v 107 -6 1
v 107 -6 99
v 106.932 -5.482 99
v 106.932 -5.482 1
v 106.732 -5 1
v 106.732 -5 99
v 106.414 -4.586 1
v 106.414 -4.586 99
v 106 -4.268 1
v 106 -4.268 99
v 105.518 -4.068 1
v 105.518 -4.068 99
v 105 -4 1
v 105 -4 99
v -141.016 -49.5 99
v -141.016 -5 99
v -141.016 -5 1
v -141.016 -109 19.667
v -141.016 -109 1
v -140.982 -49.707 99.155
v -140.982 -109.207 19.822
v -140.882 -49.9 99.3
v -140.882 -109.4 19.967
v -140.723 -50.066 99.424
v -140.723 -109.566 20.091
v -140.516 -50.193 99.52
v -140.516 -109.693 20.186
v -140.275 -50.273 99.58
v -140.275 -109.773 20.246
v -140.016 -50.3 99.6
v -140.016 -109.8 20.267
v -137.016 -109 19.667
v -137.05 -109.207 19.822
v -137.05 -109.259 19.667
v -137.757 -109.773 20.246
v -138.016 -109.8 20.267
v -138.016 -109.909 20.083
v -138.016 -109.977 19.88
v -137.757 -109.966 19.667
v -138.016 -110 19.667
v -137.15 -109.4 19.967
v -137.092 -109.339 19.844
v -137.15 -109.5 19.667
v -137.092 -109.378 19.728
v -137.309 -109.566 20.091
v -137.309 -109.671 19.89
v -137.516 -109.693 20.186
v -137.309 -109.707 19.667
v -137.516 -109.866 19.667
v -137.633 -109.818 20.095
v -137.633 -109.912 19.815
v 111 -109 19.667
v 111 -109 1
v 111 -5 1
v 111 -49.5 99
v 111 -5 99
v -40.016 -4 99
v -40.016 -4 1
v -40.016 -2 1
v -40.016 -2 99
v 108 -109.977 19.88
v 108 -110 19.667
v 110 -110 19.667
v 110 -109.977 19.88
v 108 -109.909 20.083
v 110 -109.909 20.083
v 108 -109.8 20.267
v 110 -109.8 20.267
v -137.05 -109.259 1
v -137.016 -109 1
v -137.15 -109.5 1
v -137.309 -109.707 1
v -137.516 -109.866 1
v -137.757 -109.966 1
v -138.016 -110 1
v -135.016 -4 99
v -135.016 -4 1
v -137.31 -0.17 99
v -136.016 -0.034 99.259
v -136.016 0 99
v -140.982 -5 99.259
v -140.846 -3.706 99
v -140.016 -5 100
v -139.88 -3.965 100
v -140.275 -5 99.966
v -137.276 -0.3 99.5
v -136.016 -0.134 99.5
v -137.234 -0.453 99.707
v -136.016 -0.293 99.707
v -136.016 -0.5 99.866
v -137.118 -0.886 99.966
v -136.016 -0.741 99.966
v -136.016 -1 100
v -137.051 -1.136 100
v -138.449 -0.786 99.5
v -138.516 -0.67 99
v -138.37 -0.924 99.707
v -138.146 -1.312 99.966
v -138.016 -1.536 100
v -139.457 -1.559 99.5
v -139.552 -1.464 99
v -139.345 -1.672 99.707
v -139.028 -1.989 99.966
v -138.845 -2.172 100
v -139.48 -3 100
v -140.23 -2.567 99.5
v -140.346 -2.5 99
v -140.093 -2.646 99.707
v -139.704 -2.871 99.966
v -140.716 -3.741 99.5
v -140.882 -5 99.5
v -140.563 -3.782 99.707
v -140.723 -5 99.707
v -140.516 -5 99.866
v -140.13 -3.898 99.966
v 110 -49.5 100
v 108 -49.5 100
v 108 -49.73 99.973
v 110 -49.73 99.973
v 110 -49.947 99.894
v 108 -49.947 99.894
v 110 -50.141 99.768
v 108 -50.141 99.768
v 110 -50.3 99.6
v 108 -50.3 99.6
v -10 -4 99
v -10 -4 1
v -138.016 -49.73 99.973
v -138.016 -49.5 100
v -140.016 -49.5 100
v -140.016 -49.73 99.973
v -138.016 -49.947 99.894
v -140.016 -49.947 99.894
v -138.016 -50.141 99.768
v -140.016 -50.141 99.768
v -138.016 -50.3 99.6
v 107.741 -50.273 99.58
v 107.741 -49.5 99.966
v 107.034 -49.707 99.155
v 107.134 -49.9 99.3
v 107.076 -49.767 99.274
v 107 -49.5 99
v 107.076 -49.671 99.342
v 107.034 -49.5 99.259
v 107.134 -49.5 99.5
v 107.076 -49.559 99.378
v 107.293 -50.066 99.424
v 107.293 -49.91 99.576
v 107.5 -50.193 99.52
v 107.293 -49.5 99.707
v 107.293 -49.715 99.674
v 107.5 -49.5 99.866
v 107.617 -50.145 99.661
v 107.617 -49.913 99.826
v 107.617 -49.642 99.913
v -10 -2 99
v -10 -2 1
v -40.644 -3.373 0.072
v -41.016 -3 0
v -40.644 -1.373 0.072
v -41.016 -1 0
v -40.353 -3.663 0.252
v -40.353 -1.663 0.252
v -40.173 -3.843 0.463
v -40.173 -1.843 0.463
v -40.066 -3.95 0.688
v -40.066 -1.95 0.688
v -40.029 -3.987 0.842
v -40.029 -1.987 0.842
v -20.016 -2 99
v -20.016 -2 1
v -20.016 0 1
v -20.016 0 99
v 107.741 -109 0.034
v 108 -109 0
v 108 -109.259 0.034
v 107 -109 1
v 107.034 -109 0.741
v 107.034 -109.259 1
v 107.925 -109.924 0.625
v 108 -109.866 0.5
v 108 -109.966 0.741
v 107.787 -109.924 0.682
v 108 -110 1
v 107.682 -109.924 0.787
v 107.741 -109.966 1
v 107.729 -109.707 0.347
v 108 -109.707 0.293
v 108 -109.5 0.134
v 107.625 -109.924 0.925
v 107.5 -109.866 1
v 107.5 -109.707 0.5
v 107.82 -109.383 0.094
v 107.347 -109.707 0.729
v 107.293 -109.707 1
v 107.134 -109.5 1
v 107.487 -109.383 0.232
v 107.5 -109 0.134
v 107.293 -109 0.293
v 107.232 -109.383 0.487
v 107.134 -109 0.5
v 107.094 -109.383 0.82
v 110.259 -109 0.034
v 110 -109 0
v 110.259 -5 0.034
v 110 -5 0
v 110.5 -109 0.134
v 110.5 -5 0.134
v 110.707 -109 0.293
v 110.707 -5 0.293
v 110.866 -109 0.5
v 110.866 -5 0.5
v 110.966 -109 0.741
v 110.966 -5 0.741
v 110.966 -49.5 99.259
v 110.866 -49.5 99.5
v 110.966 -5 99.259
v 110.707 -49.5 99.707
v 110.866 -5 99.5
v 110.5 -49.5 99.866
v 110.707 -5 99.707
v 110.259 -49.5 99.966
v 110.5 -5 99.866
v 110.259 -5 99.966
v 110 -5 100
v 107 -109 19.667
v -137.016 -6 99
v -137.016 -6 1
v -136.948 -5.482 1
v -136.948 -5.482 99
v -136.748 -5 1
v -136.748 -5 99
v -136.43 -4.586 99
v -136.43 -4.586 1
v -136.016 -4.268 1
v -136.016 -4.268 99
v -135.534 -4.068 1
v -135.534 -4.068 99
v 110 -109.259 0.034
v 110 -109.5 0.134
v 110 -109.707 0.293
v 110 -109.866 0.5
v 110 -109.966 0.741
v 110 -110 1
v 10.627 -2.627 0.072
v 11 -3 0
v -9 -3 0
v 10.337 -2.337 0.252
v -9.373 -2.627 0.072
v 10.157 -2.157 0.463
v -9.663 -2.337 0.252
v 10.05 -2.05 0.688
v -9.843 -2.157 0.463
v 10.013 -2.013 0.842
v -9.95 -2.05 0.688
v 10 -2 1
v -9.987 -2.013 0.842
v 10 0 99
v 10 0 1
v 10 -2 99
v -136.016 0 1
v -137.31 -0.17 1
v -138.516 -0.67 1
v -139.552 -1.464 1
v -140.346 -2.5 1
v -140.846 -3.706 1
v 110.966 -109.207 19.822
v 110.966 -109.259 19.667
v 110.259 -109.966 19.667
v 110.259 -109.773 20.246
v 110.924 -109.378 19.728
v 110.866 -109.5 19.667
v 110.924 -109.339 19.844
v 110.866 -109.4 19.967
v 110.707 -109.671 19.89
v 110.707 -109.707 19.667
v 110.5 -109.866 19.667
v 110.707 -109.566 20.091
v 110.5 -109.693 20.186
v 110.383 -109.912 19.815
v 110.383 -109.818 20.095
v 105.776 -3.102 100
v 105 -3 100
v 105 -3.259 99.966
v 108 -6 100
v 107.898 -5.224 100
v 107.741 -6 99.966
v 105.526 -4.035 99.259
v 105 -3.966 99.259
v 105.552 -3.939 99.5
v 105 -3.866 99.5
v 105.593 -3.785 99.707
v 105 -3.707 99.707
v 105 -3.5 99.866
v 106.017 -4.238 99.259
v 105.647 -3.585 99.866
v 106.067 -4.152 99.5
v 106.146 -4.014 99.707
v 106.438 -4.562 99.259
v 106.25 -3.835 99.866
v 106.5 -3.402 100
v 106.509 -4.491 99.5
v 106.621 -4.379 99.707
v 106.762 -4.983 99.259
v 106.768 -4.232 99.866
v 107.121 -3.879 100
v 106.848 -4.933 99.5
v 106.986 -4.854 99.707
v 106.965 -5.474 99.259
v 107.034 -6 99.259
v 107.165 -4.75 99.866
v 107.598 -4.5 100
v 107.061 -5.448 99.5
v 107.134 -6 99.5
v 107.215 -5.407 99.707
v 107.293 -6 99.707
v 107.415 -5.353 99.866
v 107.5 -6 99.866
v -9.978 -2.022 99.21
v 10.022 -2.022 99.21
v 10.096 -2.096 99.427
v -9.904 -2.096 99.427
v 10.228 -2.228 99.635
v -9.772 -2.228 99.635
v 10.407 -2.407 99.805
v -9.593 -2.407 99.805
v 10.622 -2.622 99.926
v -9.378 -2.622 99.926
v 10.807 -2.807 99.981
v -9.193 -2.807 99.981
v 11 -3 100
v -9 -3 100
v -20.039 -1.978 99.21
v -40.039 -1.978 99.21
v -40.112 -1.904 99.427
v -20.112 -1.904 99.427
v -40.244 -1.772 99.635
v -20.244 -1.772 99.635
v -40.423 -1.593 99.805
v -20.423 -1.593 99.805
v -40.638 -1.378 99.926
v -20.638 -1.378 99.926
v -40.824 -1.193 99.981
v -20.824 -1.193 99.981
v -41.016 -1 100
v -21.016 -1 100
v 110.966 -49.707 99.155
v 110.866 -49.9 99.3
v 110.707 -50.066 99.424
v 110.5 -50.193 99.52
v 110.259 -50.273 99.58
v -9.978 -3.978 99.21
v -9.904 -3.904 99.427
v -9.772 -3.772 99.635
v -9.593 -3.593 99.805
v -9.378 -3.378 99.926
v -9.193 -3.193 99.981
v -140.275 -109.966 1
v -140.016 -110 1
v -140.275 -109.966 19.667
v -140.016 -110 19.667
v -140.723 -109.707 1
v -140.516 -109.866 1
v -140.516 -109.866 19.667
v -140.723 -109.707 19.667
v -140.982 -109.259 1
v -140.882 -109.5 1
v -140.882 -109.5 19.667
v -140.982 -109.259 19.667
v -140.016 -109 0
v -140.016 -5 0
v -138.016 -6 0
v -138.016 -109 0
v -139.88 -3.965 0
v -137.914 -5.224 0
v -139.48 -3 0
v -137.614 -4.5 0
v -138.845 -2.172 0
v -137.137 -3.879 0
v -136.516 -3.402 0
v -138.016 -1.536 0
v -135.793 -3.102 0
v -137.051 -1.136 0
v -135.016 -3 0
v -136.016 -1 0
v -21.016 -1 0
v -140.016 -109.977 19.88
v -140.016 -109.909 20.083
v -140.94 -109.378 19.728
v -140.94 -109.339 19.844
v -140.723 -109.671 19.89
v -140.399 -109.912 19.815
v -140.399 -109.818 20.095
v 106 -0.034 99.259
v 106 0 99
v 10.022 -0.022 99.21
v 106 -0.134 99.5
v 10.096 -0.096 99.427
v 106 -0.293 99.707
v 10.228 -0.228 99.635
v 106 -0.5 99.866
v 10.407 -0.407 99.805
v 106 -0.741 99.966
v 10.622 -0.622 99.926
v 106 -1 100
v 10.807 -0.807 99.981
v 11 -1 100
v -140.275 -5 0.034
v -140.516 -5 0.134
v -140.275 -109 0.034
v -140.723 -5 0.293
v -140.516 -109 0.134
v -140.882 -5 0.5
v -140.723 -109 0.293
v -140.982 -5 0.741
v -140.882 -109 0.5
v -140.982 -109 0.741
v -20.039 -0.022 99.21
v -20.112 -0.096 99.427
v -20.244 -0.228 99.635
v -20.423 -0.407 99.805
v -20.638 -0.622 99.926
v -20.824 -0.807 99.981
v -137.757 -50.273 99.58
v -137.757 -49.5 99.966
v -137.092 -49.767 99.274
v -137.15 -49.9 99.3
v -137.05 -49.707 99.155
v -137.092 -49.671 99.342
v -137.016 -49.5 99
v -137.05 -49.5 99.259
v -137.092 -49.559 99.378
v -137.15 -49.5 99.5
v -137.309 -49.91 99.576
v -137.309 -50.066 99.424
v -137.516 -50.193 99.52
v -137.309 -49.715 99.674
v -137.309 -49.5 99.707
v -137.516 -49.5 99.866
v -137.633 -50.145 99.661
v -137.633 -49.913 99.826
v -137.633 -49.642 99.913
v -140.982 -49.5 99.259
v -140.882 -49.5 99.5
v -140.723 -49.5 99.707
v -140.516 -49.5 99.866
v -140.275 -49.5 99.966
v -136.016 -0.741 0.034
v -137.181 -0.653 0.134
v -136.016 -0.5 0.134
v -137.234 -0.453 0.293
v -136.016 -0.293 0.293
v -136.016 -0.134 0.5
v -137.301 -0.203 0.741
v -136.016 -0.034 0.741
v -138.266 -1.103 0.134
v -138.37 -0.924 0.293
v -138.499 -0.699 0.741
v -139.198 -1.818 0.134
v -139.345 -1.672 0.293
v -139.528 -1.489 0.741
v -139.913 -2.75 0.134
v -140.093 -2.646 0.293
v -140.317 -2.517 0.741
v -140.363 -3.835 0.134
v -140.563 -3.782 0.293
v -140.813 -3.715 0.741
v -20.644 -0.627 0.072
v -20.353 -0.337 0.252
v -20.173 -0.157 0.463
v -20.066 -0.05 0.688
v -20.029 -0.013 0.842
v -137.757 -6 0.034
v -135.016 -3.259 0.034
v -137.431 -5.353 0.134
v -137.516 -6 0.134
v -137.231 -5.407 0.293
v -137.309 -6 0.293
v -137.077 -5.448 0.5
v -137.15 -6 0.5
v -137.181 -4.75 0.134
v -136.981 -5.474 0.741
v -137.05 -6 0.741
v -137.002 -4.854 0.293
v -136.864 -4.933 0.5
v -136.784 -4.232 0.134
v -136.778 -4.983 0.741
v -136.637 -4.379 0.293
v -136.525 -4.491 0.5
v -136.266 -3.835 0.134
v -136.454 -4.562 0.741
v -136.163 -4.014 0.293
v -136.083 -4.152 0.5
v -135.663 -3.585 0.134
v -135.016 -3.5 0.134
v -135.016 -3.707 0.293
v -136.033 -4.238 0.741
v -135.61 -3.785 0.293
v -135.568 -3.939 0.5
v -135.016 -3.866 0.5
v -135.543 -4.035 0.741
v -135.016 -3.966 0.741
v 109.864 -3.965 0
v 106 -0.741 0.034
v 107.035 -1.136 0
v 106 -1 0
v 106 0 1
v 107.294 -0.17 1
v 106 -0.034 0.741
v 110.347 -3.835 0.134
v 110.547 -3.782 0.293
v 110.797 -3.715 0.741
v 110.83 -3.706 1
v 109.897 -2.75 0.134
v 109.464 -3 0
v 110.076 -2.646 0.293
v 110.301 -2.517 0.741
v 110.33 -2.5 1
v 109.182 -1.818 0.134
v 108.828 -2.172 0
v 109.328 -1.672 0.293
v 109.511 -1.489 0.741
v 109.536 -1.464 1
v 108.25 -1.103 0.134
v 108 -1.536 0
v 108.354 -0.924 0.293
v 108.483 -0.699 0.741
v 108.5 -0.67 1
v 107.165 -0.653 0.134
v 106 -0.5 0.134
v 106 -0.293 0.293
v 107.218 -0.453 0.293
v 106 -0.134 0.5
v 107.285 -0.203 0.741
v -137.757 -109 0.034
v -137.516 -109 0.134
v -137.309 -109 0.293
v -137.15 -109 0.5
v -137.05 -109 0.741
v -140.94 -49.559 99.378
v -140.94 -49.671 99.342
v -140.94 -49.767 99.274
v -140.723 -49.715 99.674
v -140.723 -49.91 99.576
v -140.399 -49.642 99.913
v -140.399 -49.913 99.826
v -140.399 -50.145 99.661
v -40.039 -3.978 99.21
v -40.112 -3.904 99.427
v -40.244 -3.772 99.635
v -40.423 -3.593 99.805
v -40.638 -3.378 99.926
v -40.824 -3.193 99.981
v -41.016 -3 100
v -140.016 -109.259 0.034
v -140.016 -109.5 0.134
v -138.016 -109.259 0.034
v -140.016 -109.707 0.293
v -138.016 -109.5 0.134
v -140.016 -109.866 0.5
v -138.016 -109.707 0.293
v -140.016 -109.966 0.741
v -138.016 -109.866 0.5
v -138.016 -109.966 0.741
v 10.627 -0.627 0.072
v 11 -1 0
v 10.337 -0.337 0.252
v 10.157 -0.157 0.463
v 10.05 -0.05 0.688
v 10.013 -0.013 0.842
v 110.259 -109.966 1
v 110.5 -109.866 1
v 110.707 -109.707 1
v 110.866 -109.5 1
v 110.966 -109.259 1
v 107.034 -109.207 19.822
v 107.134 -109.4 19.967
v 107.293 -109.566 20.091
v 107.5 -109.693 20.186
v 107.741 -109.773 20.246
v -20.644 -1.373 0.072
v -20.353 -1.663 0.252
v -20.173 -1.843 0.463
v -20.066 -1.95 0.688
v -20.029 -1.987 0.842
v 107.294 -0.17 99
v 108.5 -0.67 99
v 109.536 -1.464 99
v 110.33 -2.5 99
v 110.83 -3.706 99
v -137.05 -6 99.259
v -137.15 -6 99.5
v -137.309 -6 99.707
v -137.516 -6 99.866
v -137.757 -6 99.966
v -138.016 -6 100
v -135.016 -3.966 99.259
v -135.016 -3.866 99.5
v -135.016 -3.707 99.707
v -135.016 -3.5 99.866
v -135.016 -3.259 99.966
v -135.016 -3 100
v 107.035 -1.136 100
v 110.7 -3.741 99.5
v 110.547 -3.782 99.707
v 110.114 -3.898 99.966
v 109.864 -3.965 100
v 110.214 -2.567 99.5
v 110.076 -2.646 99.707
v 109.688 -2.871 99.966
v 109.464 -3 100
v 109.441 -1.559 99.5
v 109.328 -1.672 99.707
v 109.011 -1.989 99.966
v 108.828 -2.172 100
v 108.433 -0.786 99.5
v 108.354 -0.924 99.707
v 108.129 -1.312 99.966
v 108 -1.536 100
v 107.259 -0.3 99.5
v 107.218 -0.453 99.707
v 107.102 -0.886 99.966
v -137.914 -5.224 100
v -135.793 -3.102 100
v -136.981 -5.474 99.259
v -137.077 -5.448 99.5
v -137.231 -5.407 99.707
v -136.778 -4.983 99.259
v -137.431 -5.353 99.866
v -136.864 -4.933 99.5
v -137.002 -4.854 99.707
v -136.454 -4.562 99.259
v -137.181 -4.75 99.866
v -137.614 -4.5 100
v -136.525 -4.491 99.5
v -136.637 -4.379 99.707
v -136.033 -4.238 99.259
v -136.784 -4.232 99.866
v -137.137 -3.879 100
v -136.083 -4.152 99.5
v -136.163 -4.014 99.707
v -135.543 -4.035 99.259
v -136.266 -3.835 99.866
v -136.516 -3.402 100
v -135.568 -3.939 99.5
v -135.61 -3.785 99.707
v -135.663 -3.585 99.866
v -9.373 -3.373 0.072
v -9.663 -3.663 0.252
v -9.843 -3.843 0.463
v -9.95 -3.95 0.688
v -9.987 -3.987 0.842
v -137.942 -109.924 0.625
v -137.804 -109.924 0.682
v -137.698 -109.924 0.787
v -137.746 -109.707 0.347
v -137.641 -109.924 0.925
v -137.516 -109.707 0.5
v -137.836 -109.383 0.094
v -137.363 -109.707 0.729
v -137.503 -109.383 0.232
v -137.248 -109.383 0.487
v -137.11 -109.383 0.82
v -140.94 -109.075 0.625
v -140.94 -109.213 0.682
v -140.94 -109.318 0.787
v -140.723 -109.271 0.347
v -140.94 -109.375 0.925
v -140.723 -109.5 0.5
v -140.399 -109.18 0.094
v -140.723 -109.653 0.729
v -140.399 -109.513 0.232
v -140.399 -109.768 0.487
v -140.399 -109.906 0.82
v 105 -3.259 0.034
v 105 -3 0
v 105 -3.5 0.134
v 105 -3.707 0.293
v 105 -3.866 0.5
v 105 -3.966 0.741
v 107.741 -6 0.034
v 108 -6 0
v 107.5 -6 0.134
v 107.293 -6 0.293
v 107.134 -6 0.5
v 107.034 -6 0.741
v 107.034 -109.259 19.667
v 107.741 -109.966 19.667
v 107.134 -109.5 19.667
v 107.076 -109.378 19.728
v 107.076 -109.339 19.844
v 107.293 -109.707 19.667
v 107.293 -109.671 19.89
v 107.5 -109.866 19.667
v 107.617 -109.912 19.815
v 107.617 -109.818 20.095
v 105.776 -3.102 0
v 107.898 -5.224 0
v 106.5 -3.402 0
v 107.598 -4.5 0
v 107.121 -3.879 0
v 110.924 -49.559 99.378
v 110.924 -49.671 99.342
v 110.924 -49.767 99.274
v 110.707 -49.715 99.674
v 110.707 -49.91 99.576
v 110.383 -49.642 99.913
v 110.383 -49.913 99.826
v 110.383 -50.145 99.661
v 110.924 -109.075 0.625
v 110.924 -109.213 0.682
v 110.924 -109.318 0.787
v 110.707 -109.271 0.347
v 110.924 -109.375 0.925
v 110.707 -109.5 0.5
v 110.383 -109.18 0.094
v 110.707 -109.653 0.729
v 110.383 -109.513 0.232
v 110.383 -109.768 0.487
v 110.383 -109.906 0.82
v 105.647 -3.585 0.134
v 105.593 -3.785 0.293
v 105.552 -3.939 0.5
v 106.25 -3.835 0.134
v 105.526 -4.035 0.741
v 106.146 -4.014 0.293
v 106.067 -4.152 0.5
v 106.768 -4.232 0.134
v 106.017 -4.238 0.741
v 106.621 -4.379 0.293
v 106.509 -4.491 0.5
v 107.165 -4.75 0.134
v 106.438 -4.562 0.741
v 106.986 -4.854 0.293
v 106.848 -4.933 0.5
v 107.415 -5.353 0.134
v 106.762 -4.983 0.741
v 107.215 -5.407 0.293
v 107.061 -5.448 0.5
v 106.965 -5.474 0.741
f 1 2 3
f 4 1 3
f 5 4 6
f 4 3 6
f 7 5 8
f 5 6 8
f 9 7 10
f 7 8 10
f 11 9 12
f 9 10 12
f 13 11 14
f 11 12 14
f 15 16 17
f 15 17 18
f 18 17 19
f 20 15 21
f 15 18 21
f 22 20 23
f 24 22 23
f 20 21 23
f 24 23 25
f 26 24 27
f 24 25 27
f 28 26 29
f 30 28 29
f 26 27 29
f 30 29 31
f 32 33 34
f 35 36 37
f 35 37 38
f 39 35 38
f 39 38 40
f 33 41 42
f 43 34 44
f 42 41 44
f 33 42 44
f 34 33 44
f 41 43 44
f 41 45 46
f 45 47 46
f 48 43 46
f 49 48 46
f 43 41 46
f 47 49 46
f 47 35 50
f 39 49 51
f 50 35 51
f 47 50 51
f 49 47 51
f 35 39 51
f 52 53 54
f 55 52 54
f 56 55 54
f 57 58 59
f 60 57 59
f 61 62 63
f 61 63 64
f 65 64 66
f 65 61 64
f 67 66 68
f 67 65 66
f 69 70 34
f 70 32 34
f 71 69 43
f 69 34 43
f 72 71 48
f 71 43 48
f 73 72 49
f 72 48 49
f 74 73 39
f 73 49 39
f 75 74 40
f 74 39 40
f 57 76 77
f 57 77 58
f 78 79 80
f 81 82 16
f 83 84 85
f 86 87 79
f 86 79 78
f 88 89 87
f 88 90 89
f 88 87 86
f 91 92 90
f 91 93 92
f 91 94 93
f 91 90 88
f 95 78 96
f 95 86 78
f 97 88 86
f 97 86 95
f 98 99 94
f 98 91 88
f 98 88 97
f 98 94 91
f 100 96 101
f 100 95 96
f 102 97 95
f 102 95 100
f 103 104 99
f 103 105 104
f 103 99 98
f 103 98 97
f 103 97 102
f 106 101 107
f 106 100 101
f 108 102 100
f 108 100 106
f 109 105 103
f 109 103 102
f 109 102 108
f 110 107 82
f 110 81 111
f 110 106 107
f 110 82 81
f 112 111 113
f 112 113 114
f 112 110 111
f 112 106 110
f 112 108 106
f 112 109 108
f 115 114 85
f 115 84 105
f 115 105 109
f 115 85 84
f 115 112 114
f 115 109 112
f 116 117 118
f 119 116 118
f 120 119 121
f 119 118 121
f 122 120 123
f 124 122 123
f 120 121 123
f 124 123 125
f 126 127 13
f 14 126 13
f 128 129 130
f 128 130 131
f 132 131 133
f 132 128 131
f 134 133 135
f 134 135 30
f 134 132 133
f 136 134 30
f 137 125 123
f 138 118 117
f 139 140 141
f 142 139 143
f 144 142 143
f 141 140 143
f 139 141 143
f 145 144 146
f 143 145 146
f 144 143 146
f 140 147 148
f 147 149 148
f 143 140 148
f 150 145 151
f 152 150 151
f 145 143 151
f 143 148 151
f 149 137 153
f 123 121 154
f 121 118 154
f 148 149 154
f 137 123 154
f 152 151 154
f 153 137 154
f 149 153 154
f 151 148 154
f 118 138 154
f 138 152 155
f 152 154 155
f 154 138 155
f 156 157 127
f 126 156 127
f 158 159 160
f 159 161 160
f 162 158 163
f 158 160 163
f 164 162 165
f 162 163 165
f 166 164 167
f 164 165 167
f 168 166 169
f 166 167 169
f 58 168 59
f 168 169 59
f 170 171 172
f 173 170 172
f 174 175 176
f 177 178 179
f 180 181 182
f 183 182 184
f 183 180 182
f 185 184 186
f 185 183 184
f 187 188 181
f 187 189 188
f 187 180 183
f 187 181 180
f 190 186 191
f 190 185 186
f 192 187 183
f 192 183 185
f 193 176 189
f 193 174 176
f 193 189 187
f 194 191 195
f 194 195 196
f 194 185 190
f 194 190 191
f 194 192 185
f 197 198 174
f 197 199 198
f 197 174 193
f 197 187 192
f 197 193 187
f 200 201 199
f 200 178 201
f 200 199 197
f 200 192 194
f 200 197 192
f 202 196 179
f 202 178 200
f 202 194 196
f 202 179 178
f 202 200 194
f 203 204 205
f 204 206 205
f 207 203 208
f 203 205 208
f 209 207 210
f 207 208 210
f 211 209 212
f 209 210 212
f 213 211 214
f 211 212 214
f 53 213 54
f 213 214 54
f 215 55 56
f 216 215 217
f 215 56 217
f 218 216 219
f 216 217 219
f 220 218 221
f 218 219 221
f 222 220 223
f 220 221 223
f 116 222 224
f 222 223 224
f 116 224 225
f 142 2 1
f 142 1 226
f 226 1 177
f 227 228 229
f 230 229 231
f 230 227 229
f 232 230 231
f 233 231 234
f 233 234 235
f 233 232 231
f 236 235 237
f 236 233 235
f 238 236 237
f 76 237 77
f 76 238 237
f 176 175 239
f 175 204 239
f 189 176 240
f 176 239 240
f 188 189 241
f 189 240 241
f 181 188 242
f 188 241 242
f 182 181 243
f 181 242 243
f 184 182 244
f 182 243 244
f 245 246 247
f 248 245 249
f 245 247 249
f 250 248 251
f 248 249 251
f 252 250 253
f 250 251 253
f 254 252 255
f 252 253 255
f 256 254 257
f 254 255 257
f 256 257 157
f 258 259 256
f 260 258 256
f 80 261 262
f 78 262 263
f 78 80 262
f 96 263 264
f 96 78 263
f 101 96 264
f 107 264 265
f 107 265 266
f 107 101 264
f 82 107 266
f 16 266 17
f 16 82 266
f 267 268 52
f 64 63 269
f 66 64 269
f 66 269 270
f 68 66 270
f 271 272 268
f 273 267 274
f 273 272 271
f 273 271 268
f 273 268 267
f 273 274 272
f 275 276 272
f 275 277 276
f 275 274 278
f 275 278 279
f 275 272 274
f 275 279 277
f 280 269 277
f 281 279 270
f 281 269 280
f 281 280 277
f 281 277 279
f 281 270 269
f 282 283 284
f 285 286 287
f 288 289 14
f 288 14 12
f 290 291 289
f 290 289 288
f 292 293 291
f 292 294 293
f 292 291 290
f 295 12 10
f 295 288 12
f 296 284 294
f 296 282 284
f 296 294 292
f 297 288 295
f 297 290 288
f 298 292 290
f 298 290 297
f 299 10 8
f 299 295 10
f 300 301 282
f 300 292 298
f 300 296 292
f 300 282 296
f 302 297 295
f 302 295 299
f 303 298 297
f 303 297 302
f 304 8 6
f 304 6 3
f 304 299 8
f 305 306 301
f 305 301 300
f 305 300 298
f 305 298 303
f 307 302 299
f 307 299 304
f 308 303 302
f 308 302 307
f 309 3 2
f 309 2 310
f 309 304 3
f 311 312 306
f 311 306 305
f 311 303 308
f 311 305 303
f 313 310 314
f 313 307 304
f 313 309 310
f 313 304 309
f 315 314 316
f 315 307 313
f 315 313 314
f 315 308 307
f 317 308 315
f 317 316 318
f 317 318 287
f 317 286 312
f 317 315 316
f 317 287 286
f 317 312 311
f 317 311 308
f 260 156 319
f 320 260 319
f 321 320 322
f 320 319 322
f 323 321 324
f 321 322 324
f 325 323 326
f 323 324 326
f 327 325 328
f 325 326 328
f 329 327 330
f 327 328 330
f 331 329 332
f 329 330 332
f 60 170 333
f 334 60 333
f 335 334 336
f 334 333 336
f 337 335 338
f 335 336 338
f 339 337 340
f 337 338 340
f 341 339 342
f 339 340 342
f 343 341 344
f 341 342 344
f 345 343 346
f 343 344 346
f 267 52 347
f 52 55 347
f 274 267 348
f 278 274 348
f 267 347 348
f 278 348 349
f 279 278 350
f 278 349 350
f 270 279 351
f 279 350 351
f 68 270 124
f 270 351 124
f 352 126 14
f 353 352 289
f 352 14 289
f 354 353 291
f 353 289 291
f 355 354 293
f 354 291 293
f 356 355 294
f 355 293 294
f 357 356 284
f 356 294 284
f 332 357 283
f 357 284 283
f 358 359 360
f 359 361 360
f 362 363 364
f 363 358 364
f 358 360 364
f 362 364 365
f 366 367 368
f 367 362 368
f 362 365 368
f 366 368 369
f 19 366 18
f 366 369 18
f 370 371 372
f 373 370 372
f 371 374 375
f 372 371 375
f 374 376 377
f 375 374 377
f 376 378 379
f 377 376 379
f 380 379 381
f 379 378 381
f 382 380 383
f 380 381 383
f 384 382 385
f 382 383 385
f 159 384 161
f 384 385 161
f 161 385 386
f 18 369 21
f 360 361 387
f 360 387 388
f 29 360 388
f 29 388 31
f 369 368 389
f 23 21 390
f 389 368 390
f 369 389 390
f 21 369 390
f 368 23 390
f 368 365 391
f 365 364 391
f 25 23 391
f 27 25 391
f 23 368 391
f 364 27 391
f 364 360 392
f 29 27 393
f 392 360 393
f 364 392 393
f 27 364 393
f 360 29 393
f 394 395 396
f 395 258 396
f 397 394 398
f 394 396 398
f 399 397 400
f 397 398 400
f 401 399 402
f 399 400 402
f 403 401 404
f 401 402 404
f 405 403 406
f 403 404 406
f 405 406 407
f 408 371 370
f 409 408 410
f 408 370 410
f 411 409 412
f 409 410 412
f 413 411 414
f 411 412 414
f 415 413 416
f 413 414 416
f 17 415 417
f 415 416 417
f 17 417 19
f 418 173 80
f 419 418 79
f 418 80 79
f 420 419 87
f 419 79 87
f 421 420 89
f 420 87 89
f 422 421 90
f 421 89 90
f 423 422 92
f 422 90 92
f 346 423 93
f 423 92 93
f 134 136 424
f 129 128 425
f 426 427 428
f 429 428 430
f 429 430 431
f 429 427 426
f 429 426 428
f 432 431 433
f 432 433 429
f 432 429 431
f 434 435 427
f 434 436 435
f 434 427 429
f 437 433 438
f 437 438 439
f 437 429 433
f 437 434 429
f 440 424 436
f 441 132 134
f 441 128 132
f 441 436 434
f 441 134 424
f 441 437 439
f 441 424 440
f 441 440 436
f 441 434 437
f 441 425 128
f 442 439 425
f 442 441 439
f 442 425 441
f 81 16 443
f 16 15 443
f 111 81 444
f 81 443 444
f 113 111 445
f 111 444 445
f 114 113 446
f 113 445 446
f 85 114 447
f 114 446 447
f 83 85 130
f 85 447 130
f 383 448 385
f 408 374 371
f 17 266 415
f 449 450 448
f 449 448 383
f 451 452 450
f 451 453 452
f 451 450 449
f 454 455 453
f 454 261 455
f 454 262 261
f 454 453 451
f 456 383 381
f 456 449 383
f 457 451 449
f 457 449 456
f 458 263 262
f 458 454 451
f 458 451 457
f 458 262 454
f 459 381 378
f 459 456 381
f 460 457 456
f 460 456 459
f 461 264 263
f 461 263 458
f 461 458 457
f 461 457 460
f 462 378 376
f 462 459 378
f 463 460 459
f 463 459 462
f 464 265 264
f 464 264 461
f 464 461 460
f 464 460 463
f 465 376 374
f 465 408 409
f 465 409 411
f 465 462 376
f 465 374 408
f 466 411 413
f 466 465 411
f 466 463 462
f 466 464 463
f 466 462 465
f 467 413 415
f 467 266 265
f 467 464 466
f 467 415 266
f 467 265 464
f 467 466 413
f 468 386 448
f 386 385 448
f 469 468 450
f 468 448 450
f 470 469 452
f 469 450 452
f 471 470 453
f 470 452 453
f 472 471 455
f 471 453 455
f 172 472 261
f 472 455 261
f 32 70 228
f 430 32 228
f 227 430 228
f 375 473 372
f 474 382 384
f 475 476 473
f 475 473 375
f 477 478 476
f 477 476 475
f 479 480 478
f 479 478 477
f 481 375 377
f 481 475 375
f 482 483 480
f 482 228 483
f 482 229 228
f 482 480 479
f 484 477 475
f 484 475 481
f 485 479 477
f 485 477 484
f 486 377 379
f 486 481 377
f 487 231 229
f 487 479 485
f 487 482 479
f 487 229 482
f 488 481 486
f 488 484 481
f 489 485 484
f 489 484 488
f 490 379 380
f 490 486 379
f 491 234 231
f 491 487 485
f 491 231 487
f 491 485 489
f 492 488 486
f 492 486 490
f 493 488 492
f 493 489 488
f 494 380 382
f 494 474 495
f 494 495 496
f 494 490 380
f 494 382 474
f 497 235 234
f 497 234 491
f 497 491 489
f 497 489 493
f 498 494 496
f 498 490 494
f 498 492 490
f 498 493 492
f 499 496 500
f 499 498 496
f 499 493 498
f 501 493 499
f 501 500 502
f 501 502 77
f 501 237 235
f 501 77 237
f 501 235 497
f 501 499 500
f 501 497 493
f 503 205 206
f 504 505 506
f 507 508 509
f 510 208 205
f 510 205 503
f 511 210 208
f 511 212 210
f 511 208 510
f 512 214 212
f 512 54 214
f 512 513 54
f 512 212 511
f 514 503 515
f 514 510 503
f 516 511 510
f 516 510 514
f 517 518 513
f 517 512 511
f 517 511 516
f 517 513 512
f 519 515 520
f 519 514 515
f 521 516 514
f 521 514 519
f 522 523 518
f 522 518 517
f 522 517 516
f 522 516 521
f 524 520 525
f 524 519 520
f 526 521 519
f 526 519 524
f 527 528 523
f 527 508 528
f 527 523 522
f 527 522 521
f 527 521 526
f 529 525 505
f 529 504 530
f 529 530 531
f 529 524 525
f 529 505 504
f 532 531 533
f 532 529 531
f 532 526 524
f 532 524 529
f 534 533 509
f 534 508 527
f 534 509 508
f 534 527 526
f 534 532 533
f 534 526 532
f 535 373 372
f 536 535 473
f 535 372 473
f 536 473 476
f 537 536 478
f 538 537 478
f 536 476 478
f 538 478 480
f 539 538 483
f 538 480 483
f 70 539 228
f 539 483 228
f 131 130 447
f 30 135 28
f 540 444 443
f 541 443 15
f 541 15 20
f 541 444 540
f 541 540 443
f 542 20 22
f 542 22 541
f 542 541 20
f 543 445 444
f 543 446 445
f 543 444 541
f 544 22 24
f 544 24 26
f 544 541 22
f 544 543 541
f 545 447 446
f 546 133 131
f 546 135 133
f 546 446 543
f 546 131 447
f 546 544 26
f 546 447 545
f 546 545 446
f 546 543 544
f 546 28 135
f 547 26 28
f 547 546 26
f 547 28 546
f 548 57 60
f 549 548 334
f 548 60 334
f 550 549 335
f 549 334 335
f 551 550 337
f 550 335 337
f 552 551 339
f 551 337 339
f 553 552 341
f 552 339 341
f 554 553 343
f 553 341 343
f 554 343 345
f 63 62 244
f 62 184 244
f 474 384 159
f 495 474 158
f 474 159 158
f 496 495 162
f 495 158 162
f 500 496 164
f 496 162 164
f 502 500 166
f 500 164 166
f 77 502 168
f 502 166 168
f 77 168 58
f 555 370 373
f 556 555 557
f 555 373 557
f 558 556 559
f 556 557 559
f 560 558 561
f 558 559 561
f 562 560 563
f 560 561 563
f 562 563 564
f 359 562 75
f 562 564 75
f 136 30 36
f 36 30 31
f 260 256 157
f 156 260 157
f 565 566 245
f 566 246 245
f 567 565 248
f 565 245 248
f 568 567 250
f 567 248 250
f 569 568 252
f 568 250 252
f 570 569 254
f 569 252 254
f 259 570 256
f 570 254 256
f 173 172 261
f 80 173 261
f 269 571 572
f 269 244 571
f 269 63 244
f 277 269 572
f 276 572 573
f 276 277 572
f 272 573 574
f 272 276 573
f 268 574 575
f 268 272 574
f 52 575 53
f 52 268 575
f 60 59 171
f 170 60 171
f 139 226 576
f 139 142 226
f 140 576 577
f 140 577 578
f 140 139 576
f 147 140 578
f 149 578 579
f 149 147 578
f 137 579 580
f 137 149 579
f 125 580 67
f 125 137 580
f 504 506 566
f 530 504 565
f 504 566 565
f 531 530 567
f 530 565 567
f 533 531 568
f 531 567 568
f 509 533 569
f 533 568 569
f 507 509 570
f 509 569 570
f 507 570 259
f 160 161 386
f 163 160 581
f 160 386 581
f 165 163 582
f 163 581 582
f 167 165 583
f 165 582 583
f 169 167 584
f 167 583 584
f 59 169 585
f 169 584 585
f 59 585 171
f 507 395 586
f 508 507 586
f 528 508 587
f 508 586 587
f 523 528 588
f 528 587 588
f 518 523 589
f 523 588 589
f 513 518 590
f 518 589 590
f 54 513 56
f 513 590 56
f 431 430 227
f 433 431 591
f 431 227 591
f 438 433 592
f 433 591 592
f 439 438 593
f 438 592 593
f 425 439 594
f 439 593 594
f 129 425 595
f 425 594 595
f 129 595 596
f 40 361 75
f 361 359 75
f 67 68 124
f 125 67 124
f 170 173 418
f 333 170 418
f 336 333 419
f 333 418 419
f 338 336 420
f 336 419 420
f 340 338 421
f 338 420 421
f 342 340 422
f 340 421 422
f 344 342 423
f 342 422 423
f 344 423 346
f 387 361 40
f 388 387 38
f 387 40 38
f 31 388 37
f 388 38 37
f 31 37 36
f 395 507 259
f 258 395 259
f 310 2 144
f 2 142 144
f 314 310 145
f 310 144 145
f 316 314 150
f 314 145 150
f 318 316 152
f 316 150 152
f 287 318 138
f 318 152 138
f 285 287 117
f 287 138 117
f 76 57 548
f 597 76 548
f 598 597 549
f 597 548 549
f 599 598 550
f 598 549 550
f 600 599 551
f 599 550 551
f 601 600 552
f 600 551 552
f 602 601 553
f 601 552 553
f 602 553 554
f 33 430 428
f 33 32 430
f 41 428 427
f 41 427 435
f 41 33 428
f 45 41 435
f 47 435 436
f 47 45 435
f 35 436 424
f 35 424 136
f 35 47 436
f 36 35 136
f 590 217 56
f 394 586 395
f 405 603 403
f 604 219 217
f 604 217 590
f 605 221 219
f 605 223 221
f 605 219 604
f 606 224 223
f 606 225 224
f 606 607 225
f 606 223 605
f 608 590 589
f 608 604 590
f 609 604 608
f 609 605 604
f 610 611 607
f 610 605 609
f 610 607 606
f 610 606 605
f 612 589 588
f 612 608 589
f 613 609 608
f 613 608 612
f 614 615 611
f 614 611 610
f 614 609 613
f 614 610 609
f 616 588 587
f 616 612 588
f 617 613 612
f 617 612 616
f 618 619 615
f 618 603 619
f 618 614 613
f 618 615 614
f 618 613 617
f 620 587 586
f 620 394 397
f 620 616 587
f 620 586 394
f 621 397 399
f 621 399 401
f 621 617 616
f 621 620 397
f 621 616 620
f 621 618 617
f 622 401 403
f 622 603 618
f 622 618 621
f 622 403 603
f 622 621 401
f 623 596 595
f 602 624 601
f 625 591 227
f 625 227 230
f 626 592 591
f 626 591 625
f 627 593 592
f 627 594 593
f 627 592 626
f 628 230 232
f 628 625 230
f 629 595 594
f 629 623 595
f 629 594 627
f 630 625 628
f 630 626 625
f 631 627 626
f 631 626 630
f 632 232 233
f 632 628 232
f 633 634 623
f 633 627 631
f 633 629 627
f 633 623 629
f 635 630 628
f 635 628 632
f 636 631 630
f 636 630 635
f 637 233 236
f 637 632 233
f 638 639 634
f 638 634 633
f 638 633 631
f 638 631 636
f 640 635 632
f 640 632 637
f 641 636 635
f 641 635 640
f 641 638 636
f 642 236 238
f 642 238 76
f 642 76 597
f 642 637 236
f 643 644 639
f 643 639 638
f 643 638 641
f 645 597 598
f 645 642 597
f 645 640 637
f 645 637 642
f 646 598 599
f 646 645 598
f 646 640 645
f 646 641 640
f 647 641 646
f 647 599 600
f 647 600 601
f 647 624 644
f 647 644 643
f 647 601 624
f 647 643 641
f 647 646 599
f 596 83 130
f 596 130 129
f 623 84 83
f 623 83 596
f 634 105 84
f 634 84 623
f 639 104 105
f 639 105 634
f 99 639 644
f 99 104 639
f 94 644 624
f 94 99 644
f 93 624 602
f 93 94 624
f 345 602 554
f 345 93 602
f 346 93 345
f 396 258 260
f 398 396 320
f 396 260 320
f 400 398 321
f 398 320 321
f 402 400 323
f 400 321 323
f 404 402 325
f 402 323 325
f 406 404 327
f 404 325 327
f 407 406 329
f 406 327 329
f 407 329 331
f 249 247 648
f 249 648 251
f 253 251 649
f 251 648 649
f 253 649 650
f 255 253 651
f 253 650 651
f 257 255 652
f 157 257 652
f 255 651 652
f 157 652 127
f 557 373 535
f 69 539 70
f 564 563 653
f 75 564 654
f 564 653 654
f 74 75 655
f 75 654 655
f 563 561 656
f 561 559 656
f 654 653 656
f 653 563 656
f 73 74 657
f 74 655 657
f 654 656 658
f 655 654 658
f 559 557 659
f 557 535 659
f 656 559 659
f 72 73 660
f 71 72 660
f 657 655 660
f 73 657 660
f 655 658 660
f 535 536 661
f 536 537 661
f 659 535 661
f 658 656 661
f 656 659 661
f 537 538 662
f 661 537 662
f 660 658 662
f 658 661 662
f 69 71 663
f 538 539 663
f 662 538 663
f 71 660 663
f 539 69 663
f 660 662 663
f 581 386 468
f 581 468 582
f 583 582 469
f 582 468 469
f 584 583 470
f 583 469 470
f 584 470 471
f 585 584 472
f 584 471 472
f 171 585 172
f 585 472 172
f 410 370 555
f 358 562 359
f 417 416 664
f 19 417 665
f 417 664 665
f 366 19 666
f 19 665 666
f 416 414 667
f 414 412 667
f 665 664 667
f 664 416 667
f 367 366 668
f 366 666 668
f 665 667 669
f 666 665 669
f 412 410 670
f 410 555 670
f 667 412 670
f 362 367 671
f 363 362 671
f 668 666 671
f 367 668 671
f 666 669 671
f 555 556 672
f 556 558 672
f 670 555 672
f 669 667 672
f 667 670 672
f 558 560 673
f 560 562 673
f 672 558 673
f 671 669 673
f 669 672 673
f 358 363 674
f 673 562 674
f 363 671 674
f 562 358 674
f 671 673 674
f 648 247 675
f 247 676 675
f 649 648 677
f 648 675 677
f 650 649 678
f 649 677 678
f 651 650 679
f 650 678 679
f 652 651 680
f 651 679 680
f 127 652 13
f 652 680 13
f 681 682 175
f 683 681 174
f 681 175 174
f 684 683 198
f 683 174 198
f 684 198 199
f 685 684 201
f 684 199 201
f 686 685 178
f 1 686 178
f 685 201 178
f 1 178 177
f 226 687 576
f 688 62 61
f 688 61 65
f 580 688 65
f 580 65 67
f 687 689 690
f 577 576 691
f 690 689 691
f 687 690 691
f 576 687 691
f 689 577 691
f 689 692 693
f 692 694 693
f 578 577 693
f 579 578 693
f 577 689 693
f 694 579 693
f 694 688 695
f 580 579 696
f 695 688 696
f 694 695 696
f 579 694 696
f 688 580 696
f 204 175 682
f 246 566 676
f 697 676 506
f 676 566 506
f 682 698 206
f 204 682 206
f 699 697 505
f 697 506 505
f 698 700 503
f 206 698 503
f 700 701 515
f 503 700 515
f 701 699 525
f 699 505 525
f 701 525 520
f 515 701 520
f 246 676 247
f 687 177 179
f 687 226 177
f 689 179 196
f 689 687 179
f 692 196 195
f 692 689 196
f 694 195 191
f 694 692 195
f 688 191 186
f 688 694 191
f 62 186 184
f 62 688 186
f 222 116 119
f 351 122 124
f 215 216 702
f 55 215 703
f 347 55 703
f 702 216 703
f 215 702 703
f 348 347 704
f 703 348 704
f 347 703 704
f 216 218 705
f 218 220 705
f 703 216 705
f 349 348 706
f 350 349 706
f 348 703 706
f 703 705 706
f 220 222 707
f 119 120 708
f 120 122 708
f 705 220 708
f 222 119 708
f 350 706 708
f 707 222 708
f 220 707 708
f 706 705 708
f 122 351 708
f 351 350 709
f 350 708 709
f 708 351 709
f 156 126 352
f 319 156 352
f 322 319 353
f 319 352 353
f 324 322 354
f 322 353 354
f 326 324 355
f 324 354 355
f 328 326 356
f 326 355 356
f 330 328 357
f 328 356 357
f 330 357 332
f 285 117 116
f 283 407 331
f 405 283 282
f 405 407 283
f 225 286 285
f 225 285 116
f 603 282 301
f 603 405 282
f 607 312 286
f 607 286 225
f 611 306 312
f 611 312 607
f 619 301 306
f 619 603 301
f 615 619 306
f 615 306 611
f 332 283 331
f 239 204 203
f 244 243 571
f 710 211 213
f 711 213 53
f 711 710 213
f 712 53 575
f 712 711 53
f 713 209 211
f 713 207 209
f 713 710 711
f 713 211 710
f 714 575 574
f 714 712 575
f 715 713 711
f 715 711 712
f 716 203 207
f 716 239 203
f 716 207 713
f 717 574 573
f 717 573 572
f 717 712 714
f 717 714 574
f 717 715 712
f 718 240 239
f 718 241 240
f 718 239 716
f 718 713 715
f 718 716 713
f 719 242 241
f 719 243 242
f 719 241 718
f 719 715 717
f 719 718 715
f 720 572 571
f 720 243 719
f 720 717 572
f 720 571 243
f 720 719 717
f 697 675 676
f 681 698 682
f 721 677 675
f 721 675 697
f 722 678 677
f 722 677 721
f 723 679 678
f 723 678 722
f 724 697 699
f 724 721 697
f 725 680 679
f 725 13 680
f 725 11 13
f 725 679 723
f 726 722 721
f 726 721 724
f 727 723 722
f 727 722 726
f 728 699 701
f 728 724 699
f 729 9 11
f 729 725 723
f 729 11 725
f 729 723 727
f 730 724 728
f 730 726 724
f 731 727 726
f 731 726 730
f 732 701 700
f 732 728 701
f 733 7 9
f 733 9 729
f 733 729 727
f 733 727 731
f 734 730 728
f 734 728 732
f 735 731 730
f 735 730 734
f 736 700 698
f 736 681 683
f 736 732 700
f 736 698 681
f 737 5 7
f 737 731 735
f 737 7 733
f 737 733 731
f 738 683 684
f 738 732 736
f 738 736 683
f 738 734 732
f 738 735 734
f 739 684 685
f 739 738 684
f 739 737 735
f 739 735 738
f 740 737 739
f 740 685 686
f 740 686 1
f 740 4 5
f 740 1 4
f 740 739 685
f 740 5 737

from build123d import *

# Parameters (mm, degrees)
F1_DEPTH = 100
F2_DEPTH = 100
F4_DEPTH = 25
F6_DEPTH = 25
F7_R     = 5
F7_2_R   = 5
F8_R     = 2
F8_2_R   = 2
F9_R     = 0.99999
F9_2_R   = 0.99999


# Not quite as in the source:
# - a fillet or chamfer is up to 0.001 mm smaller than in the source, because OpenCascade refuses the exact size


with BuildPart() as f1:
    # F0 (on Top) → F1 (new body)
    with BuildSketch(Plane.XY):
        Polygon((107, 0), (10, 0), (10, -2), (-10, -2), (-10, -4), (107, -4), (107, -110), (111, -110), (111, 0), align=None)
    extrude(amount=F1_DEPTH)

    # F3 (on face) → F4 (cut)
    with BuildSketch(Plane.YZ.offset(111)):
        Polygon((-110, 20), (-50, 100), (-110, 100), align=None)
    extrude(amount=-F4_DEPTH, mode=Mode.SUBTRACT)

    # F7
    f7_edges = [f1.edges().sort_by_distance(p)[0] for p in [
        (111, 0, 50),
    ]]
    fillet(f7_edges, radius=F7_R)

    # F8#2
    f8_2_edges = [f1.edges().sort_by_distance(p)[0] for p in [
        (107, -4, 50),
    ]]
    fillet(f8_2_edges, radius=F8_2_R)

    # F9#2 (radius 1 in the source; OpenCascade refuses exactly that, so slightly less here)
    f9_2_edges = [f1.edges().sort_by_distance(p)[0] for p in [
        (107, -28, 100),
        (106.414214, -4.585786, 100),
        (109, -50, 100),
        (47.5, -4, 100),
        (111, -27.5, 100),
        (-10, -3, 100),
        (109.535534, -1.464466, 100),
        (0, -2, 100),
        (58, 0, 100),
        (10, -1, 100),
        (111, -80, 60),
        (107, -80, 60),
        (109, -110, 20),
        (107, -58, 0),
        (106.414214, -4.585786, 0),
        (109, -110, 0),
        (47.5, -4, 0),
        (111, -57.5, 0),
        (-10, -3, 0),
        (109.535534, -1.464466, 0),
        (0, -2, 0),
        (58, 0, 0),
        (10, -1, 0),
        (111, -110, 10),
        (107, -110, 10),
    ]]
    fillet(f9_2_edges, radius=F9_2_R)


with BuildPart() as f2:
    # F0 (on Top) → F2 (new body)
    with BuildSketch(Plane.XY):
        Polygon((-20.0161703825, 0), (-141.0161703825, 0), (-141.0161703825, -110), (-137.0161703825, -110), (-137.0161703825, -4), (-40.0161703825, -4), (-40.0161703825, -2), (-20.0161703825, -2), align=None)
    extrude(amount=F2_DEPTH)

    # F5 (on face) → F6 (cut)
    with BuildSketch(Plane(origin=(-141.0161703825, 0, 0), x_dir=(0, -1, 0), z_dir=(-1, 0, 0))):
        Polygon((110, 100), (50, 100), (110, 20), align=None)
    extrude(amount=-F6_DEPTH, mode=Mode.SUBTRACT)

    # F7#2
    f7_2_edges = [f2.edges().sort_by_distance(p)[0] for p in [
        (-141.01617, 0, 50),
    ]]
    fillet(f7_2_edges, radius=F7_2_R)

    # F8
    f8_edges = [f2.edges().sort_by_distance(p)[0] for p in [
        (-137.01617, -4, 50),
    ]]
    fillet(f8_edges, radius=F8_R)

    # F9 (radius 1 in the source; OpenCascade refuses exactly that, so slightly less here)
    f9_edges = [f2.edges().sort_by_distance(p)[0] for p in [
        (-137.01617, -28, 100),
        (-136.430384, -4.585786, 100),
        (-139.01617, -50, 100),
        (-87.51617, -4, 100),
        (-141.01617, -27.5, 100),
        (-40.01617, -3, 100),
        (-139.551704, -1.464466, 100),
        (-30.01617, -2, 100),
        (-78.01617, 0, 100),
        (-20.01617, -1, 100),
        (-141.01617, -80, 60),
        (-139.01617, -110, 20),
        (-137.01617, -80, 60),
        (-137.01617, -58, 0),
        (-136.430384, -4.585786, 0),
        (-139.01617, -110, 0),
        (-87.51617, -4, 0),
        (-141.01617, -57.5, 0),
        (-40.01617, -3, 0),
        (-139.551704, -1.464466, 0),
        (-30.01617, -2, 0),
        (-78.01617, 0, 0),
        (-20.01617, -1, 0),
        (-137.01617, -110, 10),
        (-141.01617, -110, 10),
    ]]
    fillet(f9_edges, radius=F9_R)


solid = Compound([f1.part, f2.part])
